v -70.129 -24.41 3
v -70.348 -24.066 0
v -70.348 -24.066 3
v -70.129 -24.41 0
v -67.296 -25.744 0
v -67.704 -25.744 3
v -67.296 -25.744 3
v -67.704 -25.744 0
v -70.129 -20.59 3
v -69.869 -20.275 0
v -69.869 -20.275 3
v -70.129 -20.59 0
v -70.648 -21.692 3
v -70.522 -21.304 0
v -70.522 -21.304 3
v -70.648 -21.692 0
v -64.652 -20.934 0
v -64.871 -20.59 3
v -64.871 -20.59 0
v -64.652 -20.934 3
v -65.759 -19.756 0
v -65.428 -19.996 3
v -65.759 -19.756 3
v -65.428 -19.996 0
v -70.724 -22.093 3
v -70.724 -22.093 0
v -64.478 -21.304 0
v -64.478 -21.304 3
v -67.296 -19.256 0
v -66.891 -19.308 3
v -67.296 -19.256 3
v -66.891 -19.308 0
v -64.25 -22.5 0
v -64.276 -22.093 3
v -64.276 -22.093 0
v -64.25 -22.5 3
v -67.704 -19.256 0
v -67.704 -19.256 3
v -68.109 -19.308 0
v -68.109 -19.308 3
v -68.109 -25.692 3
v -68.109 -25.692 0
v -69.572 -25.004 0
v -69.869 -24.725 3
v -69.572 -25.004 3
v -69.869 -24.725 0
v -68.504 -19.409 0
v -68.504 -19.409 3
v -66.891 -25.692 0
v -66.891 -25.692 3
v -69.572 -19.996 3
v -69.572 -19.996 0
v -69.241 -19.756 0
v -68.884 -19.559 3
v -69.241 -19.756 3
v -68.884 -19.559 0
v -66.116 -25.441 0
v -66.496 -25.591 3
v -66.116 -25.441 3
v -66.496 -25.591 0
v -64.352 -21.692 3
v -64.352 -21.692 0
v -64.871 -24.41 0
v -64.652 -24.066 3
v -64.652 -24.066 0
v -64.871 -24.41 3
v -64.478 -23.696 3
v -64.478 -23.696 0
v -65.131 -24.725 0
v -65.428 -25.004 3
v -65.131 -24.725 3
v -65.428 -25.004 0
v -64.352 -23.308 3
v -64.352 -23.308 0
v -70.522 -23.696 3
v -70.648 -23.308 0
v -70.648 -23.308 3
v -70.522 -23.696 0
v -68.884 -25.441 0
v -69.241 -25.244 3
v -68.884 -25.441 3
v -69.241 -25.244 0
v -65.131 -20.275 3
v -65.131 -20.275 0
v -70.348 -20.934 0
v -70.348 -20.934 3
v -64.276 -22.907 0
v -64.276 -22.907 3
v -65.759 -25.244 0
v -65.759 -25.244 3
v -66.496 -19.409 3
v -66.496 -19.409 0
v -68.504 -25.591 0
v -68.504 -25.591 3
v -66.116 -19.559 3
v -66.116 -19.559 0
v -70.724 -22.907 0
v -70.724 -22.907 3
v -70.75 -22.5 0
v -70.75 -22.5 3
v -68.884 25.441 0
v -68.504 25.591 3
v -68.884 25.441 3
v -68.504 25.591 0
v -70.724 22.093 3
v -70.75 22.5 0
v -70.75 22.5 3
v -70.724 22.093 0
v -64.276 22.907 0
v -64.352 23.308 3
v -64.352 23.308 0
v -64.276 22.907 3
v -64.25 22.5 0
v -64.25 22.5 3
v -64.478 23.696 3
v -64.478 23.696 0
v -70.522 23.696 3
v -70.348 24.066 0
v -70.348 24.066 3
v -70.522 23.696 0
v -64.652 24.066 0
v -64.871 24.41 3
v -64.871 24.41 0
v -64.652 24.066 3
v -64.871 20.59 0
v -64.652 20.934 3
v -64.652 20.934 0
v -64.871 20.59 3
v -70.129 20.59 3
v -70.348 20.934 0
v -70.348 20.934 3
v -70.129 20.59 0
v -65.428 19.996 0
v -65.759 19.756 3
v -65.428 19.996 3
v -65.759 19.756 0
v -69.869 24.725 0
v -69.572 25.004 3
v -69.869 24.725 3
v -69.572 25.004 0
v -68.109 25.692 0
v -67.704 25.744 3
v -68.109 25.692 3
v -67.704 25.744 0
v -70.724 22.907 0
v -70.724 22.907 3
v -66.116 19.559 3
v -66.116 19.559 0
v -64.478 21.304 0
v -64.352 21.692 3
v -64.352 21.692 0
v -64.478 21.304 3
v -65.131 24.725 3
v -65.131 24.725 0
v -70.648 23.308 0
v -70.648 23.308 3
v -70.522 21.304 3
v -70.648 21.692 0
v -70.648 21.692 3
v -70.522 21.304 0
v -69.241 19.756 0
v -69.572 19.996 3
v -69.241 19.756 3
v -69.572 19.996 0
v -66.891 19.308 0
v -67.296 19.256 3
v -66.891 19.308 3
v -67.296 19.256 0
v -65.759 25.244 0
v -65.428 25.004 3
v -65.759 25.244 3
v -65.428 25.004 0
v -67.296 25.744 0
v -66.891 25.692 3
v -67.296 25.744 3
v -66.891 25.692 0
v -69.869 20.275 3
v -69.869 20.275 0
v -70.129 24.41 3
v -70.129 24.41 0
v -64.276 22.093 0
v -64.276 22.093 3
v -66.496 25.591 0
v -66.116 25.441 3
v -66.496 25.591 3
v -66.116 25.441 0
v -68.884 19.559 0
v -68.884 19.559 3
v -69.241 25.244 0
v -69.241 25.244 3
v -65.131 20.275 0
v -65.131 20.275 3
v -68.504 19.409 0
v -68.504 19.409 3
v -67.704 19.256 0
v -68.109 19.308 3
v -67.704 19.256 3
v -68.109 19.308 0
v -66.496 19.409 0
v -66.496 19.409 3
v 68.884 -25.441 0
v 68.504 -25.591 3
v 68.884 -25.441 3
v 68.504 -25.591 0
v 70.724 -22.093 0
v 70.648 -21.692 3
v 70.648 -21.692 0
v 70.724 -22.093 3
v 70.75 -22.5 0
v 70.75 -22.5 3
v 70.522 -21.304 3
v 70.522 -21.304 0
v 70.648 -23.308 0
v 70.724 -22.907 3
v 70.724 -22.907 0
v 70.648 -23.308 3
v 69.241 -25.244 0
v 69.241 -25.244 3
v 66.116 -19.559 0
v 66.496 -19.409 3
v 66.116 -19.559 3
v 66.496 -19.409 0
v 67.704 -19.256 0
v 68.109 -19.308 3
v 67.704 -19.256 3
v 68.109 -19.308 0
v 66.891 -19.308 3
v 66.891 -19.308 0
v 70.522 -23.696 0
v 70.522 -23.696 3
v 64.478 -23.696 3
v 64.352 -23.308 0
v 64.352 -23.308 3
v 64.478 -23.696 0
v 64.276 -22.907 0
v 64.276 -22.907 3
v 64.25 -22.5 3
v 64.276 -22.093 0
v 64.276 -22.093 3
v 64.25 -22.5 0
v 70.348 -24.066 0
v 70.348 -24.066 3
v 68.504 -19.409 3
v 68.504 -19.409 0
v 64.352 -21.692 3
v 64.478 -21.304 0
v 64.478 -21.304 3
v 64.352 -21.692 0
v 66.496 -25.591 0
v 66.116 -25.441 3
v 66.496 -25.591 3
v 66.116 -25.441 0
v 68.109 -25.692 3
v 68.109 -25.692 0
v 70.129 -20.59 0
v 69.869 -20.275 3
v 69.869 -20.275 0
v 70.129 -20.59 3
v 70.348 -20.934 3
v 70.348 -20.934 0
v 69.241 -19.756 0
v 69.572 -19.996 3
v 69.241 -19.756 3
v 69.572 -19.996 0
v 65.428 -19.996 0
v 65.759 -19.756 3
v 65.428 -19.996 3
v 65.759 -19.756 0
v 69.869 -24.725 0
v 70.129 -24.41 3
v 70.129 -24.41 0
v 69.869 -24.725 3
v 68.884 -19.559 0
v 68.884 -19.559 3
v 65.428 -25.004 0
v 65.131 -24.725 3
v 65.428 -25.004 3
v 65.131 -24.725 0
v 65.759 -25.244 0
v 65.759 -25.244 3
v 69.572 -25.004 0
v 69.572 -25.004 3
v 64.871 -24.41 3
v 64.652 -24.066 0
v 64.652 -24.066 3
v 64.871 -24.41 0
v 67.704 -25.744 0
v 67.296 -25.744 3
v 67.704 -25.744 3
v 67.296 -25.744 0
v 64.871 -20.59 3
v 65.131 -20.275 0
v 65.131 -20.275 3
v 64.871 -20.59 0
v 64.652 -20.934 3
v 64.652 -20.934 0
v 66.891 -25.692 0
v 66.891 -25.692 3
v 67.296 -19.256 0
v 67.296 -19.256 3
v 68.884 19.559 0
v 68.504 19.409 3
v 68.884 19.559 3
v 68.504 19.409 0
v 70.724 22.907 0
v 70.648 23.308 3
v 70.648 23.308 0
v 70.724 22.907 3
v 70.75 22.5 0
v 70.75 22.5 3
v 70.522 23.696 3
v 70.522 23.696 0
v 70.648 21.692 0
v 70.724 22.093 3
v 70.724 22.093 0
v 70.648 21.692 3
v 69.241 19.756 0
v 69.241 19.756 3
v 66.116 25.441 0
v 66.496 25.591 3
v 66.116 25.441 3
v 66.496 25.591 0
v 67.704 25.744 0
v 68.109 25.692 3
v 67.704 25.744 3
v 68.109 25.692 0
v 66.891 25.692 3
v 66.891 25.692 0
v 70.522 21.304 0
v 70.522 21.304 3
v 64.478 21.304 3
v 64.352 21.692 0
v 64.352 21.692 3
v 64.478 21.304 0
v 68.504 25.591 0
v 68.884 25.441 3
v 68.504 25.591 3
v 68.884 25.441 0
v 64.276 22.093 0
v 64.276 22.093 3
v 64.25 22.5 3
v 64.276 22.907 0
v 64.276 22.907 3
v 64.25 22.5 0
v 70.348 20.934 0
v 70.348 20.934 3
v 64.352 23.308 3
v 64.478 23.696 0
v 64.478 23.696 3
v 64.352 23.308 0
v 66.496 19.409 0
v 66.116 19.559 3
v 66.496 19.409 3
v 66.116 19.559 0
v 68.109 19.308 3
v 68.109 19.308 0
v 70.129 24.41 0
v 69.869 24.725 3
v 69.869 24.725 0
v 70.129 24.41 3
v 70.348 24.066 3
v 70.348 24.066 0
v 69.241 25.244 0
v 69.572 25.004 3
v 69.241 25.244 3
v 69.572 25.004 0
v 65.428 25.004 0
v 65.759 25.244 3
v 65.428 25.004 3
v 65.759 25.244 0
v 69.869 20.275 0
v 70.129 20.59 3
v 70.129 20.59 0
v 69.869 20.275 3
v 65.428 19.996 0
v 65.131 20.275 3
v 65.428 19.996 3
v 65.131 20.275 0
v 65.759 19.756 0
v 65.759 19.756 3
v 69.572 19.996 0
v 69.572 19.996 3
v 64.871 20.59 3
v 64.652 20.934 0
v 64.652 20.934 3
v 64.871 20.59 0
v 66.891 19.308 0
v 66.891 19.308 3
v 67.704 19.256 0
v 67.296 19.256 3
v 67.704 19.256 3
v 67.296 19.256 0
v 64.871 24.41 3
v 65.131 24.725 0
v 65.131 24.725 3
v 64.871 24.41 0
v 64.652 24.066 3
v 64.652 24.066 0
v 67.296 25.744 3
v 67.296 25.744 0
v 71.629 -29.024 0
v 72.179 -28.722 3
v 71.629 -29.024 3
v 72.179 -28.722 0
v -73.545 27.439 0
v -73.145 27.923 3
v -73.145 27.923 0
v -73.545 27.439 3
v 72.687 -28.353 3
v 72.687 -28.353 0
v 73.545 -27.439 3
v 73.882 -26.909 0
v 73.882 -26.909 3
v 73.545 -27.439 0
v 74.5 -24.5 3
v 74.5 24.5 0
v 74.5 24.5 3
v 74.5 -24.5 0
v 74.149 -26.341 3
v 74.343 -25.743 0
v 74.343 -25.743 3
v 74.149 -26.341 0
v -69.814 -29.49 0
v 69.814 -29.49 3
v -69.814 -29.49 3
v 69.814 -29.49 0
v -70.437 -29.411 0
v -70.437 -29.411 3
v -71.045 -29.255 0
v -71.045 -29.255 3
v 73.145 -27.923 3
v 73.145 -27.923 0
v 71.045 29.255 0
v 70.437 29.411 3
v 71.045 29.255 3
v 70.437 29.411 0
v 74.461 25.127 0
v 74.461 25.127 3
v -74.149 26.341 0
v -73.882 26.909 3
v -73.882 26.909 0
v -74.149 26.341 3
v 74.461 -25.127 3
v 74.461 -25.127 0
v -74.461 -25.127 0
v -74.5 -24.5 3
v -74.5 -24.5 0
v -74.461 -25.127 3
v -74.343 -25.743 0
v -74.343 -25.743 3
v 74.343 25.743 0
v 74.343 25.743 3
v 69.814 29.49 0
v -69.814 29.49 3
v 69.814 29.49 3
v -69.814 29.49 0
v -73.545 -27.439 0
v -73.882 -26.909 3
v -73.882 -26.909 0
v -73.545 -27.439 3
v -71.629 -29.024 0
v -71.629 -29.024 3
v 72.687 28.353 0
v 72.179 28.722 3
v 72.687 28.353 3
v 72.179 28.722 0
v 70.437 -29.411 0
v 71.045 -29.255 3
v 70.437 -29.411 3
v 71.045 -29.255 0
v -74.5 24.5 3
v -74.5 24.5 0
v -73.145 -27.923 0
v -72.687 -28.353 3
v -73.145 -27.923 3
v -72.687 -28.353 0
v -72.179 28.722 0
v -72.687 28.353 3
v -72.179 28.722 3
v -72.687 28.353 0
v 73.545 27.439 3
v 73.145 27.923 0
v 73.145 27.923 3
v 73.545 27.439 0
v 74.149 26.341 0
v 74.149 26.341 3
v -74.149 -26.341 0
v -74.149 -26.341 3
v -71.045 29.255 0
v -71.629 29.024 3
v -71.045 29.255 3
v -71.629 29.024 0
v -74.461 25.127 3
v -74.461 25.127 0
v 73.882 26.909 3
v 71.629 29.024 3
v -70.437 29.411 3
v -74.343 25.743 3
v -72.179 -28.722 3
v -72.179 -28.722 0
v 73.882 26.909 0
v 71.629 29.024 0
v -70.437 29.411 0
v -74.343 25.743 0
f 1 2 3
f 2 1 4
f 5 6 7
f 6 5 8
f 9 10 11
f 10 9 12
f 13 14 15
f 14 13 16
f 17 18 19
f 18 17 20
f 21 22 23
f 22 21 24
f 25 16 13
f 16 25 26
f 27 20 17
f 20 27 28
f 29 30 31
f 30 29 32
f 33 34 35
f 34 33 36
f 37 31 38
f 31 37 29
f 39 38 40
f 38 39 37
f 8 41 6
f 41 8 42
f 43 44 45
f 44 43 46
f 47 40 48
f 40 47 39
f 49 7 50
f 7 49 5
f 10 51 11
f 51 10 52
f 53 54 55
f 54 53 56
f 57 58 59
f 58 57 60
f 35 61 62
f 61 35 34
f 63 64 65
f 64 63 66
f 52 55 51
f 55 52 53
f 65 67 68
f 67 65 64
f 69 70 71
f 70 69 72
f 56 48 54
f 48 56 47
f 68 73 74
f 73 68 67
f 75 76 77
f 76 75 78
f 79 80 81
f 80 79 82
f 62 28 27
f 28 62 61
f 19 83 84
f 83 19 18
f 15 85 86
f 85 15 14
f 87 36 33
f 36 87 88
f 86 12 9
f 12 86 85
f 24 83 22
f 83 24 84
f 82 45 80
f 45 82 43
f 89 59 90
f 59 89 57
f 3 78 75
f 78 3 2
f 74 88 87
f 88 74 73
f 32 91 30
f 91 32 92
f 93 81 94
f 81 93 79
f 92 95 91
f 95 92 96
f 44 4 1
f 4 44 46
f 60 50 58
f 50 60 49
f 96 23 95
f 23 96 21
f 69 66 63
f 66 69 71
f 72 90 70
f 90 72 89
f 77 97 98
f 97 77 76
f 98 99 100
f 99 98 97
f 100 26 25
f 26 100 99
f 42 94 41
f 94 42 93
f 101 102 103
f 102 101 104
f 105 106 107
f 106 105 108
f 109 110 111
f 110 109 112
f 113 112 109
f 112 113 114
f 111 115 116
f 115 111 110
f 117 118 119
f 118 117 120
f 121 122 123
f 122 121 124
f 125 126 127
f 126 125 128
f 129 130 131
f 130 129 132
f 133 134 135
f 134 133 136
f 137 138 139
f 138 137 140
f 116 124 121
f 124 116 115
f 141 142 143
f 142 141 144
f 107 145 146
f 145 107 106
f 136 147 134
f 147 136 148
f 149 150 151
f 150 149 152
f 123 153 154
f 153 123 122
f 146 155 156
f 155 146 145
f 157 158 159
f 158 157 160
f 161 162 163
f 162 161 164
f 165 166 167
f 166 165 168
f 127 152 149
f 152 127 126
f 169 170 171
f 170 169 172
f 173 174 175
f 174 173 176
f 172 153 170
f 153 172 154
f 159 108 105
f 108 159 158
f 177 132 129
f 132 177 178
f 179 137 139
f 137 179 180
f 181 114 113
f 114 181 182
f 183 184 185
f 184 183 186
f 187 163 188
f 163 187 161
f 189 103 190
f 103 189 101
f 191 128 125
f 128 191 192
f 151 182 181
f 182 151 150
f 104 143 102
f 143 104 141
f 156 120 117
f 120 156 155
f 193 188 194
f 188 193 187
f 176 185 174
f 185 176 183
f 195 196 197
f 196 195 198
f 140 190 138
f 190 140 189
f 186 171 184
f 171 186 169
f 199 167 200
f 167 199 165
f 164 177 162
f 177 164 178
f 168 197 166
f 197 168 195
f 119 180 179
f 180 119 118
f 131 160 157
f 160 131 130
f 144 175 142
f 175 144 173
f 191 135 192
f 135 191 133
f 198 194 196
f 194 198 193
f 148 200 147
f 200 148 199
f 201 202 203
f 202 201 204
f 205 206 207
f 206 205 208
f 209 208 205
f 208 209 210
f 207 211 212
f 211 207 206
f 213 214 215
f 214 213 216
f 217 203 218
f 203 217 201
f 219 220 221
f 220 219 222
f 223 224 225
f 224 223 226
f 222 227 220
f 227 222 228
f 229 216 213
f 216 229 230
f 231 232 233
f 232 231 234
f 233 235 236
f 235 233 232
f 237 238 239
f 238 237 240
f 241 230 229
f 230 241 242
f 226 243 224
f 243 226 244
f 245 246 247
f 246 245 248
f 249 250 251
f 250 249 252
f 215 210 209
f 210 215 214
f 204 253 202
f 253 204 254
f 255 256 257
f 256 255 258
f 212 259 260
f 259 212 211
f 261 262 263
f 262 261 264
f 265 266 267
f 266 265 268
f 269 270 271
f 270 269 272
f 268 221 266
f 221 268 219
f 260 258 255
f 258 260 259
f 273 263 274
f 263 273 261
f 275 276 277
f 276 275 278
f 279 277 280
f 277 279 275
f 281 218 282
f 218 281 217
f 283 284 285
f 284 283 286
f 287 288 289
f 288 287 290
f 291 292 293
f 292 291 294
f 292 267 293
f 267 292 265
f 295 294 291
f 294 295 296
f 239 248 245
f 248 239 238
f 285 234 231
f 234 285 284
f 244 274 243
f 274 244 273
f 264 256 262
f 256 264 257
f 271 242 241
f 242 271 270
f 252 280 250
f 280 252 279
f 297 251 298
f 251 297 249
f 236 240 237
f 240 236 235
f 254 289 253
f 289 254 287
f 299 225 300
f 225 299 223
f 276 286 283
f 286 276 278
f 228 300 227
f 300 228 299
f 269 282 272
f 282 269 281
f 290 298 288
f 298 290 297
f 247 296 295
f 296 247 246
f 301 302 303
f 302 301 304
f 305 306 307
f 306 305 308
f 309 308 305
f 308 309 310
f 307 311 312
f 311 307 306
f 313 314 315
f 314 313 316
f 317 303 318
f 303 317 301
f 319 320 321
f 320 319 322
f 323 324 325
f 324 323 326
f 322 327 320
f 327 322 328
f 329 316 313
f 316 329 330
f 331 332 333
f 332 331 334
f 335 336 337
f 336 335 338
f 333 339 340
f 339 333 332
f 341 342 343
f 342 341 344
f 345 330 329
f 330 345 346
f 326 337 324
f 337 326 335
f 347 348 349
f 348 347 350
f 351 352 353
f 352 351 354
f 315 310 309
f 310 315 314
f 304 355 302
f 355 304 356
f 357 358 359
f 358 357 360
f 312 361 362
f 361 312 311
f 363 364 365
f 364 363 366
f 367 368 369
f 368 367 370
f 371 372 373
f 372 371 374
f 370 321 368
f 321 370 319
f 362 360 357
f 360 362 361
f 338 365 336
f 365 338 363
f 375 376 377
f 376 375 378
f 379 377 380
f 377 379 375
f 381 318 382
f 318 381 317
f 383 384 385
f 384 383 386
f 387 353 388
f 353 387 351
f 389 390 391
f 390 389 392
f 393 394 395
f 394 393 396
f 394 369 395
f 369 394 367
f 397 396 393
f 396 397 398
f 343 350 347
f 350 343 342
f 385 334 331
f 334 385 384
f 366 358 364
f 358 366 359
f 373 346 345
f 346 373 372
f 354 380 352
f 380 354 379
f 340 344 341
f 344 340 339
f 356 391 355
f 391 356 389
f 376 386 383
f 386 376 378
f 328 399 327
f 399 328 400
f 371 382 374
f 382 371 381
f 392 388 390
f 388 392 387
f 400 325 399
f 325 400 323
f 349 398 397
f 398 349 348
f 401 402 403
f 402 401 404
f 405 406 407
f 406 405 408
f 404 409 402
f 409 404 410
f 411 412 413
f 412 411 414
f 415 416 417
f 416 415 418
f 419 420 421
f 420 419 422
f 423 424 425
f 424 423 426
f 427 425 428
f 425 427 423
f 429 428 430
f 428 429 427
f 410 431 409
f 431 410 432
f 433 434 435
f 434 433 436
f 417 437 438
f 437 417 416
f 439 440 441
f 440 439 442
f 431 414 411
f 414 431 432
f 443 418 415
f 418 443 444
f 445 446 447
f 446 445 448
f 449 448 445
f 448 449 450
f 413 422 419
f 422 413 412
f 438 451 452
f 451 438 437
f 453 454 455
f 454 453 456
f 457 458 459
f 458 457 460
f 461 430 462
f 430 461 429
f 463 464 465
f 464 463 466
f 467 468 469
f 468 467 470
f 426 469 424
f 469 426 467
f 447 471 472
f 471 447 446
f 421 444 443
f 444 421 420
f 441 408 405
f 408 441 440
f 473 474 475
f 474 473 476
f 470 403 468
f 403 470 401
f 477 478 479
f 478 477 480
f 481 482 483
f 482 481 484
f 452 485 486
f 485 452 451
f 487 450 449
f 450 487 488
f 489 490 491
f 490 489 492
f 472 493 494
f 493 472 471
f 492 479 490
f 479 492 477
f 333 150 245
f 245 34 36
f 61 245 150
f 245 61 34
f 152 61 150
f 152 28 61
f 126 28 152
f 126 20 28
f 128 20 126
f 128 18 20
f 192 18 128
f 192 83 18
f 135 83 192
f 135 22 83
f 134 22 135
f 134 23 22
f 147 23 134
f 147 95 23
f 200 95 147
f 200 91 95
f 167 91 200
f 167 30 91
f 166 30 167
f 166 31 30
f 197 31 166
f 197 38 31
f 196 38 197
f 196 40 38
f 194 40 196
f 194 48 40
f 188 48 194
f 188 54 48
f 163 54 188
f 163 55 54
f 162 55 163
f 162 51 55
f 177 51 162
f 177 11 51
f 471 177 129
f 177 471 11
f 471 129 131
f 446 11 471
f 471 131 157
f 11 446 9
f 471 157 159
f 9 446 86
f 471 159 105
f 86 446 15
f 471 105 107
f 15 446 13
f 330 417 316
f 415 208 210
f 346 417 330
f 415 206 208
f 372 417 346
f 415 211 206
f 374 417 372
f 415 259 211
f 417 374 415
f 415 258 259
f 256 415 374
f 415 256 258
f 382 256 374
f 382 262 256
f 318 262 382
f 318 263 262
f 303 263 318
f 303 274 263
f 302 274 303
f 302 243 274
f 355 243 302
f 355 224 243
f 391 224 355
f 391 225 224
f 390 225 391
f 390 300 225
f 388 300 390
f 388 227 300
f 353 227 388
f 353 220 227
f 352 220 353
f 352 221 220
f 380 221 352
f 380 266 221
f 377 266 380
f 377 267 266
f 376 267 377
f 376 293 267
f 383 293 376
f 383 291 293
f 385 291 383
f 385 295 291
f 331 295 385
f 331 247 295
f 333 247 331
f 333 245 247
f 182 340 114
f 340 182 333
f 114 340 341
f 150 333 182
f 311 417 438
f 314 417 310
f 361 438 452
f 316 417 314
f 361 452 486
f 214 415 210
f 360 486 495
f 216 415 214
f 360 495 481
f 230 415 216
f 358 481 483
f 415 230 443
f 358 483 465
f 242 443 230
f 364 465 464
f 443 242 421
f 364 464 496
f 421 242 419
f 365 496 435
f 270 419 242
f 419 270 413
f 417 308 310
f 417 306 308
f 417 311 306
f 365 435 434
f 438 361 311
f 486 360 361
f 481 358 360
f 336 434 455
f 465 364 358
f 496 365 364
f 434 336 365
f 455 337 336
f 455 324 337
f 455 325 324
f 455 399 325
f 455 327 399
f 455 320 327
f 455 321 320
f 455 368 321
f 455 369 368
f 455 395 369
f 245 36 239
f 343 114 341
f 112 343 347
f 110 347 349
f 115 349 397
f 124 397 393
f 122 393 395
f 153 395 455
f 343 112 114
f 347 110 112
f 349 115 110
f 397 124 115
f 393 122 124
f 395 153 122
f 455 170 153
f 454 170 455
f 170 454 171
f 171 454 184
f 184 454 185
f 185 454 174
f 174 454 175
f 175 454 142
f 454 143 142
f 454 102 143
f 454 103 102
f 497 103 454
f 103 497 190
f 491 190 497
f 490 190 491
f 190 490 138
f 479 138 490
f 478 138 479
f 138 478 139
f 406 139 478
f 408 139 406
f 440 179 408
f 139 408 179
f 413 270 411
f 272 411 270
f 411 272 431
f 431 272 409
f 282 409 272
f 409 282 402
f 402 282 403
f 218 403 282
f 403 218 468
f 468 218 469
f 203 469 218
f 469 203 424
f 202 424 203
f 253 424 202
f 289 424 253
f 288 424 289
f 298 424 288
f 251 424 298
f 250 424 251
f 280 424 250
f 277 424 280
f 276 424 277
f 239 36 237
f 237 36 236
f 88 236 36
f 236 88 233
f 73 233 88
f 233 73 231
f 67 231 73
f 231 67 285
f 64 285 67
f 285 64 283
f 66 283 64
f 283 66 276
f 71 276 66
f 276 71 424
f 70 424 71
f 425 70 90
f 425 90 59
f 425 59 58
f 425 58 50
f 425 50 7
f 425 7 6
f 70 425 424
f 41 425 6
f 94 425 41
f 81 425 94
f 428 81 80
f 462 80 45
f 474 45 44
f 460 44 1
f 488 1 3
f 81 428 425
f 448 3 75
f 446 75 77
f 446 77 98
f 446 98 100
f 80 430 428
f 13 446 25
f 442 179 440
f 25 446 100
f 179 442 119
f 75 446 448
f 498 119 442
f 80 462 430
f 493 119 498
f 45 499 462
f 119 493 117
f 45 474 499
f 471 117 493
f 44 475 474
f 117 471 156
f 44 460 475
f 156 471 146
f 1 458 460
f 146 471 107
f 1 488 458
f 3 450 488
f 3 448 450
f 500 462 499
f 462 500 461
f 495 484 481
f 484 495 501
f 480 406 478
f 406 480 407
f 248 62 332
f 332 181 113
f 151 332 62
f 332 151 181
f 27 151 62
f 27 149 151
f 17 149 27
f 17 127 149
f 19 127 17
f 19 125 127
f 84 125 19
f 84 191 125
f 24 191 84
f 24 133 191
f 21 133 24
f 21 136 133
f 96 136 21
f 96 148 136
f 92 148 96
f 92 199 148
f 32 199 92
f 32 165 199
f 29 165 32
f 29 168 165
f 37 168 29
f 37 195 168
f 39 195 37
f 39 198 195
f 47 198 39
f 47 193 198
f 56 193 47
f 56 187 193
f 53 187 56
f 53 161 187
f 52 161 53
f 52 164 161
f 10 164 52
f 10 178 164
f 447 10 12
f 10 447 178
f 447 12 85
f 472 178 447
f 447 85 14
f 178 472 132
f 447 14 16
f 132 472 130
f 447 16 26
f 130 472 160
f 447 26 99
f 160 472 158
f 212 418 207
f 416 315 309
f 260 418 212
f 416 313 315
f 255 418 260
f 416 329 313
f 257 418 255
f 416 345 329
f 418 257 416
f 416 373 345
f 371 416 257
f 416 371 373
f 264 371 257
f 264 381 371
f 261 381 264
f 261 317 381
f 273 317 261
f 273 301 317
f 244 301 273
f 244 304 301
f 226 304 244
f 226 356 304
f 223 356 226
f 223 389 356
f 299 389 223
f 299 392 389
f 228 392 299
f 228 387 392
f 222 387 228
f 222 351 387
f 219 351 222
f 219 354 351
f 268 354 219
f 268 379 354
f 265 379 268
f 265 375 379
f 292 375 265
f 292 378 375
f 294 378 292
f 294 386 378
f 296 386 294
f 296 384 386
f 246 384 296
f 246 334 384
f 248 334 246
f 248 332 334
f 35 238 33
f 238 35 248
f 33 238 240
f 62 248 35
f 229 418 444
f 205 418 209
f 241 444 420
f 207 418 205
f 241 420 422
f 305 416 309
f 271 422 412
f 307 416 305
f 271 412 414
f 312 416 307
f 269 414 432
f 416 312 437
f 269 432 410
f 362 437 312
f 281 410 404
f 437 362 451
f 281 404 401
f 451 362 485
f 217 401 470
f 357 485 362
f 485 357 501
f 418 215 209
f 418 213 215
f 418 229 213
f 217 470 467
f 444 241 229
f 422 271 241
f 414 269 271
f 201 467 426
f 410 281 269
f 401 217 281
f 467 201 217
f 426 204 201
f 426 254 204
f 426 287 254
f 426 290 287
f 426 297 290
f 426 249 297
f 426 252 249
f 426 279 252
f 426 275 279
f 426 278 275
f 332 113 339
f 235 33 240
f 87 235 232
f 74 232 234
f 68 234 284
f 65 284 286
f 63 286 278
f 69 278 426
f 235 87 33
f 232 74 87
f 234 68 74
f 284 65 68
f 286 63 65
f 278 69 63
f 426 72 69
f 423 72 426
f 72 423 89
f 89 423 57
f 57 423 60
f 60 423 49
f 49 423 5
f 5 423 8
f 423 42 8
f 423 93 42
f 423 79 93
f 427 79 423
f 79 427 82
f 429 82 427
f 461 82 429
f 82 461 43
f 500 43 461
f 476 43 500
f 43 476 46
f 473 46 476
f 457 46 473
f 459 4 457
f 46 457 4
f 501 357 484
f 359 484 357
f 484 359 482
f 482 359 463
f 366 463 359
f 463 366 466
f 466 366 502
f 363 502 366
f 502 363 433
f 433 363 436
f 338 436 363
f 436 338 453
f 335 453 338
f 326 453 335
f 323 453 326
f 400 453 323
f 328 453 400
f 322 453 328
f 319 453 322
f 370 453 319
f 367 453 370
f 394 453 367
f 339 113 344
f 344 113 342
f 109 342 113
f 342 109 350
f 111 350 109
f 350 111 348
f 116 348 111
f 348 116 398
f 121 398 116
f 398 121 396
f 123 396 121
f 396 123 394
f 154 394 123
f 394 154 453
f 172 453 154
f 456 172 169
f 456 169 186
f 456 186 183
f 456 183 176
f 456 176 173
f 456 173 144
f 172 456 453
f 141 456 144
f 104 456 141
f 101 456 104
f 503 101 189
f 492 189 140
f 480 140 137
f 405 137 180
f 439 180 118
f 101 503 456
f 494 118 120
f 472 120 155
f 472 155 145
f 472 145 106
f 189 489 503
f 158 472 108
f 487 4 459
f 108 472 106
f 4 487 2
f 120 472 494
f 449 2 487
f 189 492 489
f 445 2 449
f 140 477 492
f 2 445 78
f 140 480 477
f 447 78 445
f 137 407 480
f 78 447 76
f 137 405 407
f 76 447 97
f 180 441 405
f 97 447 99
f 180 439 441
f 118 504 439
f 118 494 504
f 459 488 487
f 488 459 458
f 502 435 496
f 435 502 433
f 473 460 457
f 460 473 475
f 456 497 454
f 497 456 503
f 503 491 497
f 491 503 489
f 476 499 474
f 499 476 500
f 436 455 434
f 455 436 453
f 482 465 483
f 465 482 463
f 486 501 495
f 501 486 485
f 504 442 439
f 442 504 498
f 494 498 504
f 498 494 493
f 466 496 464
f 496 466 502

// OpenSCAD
$fn = 50;


difference() {
	union() {
		hull() {
			translate(v = [-69.5000000000, 24.5000000000, 0]) {
				cylinder(h = 3, r = 5);
			}
			translate(v = [69.5000000000, 24.5000000000, 0]) {
				cylinder(h = 3, r = 5);
			}
			translate(v = [-69.5000000000, -24.5000000000, 0]) {
				cylinder(h = 3, r = 5);
			}
			translate(v = [69.5000000000, -24.5000000000, 0]) {
				cylinder(h = 3, r = 5);
			}
		}
	}
	union() {
		translate(v = [-67.5000000000, -22.5000000000, -100.0000000000]) {
			cylinder(h = 200, r = 3.2500000000);
		}
		translate(v = [-67.5000000000, 22.5000000000, -100.0000000000]) {
			cylinder(h = 200, r = 3.2500000000);
		}
		translate(v = [67.5000000000, -22.5000000000, -100.0000000000]) {
			cylinder(h = 200, r = 3.2500000000);
		}
		translate(v = [67.5000000000, 22.5000000000, -100.0000000000]) {
			cylinder(h = 200, r = 3.2500000000);
		}
	}
}
